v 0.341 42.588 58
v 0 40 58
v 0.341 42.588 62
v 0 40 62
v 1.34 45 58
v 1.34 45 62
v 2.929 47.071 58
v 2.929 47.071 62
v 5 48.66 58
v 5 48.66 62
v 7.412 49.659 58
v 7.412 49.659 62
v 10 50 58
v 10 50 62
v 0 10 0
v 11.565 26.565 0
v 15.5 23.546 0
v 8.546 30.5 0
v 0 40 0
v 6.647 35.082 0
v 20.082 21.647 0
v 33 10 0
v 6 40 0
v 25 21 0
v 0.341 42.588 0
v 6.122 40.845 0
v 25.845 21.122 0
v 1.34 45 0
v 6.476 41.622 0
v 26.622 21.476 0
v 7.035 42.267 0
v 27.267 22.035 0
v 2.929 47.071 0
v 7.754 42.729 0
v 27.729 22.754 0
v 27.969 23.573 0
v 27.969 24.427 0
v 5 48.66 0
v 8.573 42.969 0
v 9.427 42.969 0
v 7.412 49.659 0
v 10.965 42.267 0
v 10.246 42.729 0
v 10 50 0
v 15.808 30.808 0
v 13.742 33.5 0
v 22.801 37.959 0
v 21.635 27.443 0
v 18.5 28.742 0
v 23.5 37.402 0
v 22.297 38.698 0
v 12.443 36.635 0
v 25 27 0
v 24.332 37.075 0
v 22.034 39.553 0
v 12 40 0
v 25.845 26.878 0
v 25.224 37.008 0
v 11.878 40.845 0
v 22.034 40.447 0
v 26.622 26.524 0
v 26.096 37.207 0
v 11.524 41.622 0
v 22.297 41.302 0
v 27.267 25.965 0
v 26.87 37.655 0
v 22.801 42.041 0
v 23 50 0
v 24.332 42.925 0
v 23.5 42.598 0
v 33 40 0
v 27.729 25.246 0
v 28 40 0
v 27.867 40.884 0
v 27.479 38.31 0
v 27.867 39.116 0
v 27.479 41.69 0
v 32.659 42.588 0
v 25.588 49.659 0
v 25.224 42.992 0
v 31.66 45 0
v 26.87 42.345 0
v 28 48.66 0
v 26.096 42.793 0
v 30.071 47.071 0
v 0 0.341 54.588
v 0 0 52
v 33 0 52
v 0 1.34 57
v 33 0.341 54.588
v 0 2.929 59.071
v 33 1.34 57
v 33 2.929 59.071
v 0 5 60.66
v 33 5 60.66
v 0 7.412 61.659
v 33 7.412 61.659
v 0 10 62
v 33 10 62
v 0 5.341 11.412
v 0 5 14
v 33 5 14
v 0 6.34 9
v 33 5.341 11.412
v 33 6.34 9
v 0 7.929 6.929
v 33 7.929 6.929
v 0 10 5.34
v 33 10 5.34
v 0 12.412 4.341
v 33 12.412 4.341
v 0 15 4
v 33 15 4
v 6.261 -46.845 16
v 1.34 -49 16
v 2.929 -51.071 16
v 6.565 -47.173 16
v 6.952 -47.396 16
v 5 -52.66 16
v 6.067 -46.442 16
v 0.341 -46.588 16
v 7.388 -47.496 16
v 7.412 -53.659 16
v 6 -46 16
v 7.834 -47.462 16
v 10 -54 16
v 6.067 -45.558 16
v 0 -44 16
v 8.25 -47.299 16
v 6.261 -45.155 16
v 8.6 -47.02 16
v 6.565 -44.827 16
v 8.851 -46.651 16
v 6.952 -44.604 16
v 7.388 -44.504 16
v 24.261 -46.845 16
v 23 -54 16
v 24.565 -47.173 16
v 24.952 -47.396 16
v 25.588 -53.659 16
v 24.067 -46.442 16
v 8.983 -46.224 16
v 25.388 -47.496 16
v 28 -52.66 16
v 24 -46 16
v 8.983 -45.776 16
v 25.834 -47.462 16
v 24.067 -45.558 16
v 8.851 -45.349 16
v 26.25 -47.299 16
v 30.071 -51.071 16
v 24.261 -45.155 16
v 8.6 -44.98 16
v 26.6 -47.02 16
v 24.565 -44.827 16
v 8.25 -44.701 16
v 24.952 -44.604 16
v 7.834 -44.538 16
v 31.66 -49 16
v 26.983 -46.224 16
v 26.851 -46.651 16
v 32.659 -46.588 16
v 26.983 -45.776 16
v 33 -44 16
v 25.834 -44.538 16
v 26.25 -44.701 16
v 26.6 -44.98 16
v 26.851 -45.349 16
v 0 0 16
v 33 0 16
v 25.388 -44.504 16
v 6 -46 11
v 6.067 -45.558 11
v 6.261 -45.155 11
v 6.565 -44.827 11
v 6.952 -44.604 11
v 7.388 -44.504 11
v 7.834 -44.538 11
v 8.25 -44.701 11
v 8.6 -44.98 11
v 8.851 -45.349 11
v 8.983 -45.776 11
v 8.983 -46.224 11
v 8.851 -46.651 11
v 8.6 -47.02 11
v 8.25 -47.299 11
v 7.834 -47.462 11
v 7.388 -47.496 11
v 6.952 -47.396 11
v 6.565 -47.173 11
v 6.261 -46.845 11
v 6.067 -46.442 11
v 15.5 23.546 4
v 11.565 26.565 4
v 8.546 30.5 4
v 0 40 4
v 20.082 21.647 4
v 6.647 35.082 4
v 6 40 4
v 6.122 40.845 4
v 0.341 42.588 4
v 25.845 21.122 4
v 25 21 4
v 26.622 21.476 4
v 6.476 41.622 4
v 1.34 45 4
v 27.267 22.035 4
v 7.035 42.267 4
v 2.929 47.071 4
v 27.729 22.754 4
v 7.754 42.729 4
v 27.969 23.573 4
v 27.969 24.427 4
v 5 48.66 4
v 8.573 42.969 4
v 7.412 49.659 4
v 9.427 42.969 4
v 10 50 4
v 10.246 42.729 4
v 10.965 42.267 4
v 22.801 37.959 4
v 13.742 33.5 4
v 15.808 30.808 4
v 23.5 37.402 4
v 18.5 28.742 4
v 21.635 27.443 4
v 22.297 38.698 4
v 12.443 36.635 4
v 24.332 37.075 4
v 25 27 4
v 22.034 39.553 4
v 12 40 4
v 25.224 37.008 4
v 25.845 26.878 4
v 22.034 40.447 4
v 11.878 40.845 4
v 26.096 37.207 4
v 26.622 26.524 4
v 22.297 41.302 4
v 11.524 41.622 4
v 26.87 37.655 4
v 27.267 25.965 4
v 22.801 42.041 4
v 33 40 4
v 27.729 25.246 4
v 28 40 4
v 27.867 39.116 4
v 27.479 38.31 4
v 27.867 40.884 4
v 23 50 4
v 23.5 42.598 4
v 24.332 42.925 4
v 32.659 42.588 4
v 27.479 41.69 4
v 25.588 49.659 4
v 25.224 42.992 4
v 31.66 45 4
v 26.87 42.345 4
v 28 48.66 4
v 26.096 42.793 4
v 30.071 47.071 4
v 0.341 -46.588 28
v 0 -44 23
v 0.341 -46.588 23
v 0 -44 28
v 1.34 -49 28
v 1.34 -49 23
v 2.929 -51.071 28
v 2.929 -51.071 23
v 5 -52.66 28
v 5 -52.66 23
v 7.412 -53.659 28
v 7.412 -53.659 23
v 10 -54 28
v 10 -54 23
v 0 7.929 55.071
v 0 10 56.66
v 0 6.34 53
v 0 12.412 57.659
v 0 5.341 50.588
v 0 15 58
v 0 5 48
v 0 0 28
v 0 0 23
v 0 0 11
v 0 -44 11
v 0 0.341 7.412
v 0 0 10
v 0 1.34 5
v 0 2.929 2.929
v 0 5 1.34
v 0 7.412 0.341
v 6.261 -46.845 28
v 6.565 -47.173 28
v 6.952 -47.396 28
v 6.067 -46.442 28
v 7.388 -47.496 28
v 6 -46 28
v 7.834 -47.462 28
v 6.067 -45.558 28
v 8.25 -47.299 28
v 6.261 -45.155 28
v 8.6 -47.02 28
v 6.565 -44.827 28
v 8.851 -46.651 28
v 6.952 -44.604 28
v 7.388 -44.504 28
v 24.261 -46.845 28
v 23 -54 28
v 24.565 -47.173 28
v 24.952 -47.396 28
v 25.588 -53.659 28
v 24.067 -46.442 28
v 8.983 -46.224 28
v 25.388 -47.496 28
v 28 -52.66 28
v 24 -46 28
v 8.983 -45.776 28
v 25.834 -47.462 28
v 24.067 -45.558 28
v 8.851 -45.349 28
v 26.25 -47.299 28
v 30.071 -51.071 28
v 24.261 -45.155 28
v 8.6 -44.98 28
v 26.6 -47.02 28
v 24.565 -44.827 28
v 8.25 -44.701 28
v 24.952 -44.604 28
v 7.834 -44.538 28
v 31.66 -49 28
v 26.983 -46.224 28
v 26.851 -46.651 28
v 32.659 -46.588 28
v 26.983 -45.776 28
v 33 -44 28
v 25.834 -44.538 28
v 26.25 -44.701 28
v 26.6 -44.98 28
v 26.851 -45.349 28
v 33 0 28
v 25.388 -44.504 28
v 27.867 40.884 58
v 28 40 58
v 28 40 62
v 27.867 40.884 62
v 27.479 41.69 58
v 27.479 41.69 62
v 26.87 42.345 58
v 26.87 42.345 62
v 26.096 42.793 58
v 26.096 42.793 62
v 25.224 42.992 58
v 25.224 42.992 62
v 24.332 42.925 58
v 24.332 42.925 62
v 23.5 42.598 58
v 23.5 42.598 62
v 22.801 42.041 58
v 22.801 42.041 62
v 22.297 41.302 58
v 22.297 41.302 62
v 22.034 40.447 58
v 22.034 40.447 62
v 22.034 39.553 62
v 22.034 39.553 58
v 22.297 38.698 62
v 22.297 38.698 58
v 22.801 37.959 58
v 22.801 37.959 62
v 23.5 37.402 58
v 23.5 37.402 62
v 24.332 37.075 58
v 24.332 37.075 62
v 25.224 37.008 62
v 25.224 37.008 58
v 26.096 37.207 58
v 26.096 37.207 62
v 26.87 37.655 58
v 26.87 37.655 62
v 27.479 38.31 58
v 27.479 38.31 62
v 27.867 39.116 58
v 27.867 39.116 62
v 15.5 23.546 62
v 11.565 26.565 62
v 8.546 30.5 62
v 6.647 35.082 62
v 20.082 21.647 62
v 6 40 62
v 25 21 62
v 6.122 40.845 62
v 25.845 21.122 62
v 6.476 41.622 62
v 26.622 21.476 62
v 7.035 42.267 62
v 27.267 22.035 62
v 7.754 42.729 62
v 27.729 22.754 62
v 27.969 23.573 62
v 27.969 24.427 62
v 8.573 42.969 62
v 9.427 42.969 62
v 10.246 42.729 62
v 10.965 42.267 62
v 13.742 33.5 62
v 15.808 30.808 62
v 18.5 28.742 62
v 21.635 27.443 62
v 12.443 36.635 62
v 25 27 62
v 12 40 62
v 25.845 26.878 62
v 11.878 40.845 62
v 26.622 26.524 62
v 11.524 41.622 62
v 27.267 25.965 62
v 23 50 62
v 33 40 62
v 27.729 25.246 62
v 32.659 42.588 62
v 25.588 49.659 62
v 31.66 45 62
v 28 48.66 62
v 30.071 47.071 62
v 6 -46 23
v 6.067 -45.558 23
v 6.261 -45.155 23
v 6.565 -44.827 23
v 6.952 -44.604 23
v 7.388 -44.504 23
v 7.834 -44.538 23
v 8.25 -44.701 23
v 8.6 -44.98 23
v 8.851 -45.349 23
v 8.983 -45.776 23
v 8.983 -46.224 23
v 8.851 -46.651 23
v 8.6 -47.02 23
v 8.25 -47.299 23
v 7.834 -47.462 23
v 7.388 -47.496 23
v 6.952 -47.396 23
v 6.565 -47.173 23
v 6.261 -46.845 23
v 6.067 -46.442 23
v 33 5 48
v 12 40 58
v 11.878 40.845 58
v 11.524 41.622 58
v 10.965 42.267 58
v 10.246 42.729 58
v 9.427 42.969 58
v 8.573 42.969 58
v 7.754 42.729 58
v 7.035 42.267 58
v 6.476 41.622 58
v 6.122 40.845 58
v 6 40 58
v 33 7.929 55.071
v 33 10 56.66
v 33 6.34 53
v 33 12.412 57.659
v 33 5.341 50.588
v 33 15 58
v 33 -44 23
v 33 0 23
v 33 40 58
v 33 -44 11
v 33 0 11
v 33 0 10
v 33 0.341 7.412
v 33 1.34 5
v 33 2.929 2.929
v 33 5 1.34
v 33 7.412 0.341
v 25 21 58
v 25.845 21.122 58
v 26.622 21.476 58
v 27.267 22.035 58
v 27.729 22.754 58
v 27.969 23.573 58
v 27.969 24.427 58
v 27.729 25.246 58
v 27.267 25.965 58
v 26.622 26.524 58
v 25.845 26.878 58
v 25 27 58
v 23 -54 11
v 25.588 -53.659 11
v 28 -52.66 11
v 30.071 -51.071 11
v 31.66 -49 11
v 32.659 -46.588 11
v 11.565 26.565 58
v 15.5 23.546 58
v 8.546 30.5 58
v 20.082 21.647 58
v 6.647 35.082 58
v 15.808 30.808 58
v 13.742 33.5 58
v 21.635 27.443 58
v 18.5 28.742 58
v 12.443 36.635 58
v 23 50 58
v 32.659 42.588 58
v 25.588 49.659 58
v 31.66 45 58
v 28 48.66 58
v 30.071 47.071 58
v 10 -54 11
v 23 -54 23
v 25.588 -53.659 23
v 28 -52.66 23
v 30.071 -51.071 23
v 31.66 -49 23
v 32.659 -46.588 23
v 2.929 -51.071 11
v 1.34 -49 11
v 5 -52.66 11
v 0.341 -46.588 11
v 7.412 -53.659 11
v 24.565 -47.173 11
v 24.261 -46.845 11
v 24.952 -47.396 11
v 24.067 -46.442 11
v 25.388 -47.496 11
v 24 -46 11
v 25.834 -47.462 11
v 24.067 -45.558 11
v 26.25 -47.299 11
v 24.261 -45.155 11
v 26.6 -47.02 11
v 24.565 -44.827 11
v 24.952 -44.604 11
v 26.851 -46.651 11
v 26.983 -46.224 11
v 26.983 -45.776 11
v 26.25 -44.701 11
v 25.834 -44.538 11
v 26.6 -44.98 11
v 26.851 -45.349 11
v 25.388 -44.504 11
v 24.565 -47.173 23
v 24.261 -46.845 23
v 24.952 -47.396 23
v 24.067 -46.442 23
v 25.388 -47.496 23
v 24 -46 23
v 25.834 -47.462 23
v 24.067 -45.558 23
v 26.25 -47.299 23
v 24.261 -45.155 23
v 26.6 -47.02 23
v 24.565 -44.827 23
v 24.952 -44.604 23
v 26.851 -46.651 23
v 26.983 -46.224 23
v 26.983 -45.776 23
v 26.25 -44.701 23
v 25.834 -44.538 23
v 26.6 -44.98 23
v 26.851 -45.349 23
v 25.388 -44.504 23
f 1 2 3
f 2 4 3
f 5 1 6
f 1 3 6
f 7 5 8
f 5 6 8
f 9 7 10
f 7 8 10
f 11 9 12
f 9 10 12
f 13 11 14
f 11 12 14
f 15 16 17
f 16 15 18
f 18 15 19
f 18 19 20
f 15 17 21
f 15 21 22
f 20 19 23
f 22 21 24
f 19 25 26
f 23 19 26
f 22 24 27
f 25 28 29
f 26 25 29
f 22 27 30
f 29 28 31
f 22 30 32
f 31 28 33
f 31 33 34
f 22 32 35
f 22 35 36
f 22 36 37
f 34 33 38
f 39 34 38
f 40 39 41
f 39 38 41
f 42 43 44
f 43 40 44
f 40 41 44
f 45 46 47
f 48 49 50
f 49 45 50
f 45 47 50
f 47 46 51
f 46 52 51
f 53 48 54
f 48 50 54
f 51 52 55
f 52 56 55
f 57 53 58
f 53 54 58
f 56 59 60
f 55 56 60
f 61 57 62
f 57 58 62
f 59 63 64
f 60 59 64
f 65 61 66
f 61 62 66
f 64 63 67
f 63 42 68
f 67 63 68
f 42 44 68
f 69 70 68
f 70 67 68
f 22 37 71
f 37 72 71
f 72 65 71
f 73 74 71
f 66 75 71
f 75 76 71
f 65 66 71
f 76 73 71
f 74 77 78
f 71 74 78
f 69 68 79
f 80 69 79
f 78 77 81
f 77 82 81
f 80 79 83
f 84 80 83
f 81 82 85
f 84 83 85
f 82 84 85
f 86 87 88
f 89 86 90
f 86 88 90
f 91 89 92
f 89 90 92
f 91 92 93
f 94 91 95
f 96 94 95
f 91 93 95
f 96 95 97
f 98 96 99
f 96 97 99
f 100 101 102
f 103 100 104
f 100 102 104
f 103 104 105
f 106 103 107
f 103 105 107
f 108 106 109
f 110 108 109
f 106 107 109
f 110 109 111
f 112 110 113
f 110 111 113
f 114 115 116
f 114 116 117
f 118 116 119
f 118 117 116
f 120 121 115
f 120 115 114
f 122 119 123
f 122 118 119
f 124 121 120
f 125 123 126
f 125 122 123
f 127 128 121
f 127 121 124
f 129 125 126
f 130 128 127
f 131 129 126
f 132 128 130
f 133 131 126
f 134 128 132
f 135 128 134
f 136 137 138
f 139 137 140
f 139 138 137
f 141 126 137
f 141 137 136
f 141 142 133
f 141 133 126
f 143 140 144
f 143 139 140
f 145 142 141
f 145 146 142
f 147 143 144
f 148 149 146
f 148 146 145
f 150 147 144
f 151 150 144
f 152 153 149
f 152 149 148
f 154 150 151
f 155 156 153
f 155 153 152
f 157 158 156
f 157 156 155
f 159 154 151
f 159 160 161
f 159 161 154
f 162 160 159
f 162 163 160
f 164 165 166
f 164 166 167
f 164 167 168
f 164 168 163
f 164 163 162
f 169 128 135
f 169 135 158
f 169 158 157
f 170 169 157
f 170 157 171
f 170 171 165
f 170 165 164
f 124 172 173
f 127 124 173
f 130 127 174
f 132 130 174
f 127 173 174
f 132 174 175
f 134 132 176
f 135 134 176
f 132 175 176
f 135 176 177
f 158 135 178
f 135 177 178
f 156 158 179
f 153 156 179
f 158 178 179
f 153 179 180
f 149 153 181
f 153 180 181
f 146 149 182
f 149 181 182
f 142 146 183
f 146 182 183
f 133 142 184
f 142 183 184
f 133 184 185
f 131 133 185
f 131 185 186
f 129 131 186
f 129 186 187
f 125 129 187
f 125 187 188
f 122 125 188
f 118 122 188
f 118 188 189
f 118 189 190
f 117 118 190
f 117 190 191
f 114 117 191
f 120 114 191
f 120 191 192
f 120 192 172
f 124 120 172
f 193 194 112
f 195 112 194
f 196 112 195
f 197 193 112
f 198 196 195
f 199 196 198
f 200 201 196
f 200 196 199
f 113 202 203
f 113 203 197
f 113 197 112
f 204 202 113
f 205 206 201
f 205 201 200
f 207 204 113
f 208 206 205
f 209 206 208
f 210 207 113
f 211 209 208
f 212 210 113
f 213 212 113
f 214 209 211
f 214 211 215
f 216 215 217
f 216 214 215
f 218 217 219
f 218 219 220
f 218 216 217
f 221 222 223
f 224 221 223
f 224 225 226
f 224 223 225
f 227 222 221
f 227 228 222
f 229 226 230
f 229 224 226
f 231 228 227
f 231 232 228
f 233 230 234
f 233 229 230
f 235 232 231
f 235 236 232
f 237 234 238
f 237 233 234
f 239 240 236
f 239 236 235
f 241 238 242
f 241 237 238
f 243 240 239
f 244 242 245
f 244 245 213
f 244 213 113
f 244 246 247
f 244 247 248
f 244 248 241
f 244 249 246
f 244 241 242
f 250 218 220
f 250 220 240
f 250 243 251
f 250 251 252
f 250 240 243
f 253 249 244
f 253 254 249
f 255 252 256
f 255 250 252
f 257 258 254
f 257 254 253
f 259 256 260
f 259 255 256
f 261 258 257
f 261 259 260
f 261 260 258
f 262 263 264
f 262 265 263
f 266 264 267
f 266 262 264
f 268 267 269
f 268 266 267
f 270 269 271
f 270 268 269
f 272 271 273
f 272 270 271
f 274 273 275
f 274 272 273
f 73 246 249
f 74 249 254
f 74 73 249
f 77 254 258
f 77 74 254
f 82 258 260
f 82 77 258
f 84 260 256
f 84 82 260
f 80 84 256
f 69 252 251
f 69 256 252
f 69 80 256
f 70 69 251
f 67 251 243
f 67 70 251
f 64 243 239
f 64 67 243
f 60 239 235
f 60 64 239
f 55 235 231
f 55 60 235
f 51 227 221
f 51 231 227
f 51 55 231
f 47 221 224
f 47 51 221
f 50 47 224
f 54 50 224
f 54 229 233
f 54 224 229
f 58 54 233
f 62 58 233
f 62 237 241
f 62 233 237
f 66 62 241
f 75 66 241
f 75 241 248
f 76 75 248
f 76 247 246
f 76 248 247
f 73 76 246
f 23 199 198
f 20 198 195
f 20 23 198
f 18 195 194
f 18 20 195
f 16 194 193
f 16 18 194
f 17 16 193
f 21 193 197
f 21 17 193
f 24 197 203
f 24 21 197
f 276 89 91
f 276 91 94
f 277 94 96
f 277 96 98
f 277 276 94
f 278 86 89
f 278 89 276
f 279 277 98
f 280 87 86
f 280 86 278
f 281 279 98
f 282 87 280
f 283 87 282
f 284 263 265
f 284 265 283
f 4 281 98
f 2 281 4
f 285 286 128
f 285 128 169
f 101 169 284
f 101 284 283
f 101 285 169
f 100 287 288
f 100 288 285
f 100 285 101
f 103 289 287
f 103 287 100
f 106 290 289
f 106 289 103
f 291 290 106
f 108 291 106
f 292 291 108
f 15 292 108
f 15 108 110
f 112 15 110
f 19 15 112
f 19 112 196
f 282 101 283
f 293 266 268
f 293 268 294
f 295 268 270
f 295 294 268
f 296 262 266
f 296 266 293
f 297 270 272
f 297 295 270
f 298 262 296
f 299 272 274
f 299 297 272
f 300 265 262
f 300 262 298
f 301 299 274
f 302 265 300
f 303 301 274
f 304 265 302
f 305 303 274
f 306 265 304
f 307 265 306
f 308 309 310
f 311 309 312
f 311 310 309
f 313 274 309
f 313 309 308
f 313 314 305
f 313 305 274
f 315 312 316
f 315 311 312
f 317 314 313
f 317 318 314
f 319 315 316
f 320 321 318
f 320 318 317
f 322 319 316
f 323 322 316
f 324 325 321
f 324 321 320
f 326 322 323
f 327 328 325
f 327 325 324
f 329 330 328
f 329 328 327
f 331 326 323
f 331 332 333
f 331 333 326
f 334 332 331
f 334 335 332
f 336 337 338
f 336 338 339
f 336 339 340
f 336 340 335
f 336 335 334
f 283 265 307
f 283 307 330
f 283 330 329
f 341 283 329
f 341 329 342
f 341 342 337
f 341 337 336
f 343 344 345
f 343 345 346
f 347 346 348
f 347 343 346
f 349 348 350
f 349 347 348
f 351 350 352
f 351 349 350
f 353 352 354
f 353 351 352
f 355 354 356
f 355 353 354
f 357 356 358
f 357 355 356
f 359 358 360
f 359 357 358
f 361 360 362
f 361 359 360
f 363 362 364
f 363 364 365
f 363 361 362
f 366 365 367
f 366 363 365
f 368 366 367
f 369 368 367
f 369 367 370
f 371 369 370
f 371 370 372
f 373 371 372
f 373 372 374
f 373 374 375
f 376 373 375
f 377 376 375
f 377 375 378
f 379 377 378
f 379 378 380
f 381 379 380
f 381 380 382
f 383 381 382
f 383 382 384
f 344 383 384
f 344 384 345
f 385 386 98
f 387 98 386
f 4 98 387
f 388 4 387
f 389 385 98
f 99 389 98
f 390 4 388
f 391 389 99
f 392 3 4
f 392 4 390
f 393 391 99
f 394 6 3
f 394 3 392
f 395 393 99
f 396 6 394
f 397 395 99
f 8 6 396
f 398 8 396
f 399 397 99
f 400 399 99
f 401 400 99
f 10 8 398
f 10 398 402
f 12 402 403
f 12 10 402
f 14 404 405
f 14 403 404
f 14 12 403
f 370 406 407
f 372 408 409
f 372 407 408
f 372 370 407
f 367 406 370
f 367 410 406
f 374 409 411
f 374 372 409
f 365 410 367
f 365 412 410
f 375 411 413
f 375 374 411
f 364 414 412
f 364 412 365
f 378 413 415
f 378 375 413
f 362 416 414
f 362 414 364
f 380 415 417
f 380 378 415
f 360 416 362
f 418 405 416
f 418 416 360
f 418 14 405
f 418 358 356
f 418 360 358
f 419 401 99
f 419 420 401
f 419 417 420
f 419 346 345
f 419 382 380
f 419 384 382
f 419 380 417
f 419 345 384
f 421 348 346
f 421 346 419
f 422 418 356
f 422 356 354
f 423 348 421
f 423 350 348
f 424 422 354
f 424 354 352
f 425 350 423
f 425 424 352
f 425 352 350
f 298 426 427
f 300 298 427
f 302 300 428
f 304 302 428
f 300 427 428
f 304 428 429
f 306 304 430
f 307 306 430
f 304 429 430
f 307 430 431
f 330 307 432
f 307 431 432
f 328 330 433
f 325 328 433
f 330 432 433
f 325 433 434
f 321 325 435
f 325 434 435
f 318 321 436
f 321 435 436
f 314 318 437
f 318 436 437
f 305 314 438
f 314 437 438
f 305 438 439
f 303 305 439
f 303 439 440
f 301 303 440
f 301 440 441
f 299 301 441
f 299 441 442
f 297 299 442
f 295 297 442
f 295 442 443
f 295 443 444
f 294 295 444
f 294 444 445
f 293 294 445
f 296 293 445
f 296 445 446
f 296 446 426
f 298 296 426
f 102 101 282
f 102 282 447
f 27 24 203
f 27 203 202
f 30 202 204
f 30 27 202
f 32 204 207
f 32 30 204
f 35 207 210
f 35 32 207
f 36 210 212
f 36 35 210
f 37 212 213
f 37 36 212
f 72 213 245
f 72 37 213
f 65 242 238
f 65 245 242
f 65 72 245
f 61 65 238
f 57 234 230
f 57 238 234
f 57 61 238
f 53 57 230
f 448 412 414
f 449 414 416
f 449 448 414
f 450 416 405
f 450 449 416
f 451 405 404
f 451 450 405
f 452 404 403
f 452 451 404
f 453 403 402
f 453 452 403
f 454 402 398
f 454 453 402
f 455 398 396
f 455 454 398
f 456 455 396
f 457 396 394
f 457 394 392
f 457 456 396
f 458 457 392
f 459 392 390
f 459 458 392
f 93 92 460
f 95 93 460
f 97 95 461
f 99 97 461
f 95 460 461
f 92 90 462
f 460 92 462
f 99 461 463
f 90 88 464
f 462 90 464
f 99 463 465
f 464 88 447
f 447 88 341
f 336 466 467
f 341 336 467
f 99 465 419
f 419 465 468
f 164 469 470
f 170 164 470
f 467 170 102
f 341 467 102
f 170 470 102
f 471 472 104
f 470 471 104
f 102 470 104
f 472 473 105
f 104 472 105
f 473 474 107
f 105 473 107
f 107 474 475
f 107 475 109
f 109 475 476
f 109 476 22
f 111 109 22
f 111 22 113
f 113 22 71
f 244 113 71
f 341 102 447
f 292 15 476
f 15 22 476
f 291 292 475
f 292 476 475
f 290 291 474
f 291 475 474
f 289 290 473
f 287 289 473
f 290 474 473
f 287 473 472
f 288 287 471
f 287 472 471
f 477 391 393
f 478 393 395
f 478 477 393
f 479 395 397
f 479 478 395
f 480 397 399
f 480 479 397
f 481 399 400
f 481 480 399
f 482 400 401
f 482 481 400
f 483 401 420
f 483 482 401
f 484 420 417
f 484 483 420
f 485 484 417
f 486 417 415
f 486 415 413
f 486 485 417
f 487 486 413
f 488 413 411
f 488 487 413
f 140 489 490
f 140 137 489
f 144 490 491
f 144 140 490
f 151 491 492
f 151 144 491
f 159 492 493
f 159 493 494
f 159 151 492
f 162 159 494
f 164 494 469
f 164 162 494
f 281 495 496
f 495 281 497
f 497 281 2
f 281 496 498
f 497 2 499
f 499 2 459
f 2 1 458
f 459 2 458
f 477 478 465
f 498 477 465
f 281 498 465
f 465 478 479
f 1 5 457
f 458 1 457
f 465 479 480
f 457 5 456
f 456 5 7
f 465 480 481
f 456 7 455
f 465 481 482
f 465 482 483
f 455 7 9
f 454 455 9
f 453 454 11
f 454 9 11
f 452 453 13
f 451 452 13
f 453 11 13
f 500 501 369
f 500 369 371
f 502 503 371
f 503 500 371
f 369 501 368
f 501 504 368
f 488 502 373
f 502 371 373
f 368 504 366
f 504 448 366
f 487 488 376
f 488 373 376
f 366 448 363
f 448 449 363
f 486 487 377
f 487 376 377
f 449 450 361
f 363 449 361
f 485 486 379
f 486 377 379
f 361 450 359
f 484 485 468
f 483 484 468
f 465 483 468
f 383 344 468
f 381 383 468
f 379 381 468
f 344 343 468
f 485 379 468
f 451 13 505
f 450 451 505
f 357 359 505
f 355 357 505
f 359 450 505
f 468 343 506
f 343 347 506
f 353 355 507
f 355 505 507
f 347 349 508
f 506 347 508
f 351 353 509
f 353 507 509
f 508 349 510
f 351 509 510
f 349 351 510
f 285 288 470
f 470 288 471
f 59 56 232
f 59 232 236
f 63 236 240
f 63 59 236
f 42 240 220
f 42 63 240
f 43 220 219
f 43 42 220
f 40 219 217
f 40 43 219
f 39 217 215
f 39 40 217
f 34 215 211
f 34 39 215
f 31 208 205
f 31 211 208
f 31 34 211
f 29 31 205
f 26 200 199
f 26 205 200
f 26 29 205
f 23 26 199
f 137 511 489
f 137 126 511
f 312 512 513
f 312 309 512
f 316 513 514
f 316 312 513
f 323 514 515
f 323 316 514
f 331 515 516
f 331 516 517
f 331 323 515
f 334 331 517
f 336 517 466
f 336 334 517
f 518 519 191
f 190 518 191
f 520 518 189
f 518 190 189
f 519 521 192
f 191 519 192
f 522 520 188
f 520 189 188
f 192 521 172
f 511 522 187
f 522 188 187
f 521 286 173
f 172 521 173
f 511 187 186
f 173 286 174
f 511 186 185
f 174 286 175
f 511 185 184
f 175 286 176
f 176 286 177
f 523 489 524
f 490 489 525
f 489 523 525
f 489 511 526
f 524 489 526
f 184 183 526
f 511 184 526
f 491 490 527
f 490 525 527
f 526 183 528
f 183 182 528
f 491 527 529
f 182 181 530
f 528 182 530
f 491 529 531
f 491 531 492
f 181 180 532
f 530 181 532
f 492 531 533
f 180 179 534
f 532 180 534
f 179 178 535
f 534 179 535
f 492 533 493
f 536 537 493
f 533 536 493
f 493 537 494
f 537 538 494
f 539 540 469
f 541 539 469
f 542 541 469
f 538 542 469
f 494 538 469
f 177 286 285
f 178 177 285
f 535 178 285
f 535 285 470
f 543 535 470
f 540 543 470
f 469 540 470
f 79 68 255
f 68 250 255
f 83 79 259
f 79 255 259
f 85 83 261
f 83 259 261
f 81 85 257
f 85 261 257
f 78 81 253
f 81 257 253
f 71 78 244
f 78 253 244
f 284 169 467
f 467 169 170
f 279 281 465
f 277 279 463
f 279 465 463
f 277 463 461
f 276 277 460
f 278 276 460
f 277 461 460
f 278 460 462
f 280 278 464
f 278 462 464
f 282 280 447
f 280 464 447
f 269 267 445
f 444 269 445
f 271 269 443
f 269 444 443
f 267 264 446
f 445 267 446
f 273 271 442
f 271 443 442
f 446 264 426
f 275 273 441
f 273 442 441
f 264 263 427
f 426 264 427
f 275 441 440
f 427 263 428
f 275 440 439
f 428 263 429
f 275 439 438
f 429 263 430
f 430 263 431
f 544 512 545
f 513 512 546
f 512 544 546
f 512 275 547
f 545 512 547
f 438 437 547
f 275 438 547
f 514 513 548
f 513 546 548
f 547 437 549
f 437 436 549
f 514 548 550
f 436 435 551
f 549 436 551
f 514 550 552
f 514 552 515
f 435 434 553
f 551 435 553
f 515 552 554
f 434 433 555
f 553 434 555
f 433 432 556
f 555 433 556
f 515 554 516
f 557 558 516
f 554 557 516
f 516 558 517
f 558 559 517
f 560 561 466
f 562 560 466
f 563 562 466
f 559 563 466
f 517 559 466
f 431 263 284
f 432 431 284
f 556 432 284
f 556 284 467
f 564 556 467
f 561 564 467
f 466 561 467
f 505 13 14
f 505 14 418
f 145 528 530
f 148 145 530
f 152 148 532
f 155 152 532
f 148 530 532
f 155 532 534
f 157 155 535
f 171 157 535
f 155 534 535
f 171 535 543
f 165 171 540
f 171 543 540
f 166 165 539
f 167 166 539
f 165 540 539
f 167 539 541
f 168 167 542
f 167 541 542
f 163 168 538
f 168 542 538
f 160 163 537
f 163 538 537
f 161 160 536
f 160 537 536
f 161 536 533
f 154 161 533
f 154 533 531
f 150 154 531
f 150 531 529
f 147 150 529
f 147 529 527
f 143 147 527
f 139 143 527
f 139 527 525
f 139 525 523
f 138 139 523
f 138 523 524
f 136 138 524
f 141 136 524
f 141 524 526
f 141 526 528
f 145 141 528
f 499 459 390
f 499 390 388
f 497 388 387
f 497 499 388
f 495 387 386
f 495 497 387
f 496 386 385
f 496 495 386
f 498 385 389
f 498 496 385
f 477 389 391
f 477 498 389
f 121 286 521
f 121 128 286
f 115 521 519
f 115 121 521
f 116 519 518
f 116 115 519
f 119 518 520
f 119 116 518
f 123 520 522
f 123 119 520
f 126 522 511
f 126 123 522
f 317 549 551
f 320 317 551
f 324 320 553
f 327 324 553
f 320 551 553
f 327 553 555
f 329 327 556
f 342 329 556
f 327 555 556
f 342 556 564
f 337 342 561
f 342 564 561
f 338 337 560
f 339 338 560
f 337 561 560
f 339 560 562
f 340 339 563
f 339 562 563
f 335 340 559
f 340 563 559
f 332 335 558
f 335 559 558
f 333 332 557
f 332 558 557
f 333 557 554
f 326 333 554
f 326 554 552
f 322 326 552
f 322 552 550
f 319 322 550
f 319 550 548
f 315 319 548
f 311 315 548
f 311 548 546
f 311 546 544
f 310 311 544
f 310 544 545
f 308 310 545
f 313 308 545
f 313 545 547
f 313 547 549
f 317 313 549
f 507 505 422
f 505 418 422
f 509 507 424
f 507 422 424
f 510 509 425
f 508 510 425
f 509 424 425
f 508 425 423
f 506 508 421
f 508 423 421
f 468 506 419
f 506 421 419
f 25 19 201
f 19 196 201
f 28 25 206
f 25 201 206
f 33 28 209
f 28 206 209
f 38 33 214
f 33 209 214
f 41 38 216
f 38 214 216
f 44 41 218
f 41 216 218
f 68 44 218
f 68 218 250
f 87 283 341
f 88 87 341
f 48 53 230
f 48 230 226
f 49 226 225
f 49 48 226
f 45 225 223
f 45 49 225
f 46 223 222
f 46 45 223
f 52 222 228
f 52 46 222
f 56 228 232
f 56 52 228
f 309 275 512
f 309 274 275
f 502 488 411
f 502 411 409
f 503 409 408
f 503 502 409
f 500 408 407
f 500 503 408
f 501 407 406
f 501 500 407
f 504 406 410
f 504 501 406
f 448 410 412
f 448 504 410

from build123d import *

# Parameters (mm, degrees)
ESBO_O1_W                = 33
ESBO_O1_H                = 50
ESBO_O1_R                = 3
RESSALTO_EXTRUS_O2_DEPTH = 62
ESBO_O3_W                = 33
ESBO_O3_H                = 54
CORTE_EXTRUS_O1_DEPTH    = 45
ESBO_O7_W                = 33
ESBO_O7_H                = 5
RESSALTO_EXTRUS_O3_DEPTH = 54
ESBO_O10_R               = 1.5
CORTE_EXTRUS_O2_DEPTH    = 82.277303105
FILETE1_R                = 10


with BuildPart() as part:
    # Esboço1 → Ressalto-extrusão2 (new body)
    with BuildSketch(Plane.XY):
        with Locations((16.5, 25)):
            Rectangle(ESBO_O1_W, ESBO_O1_H)
        with Locations((25, 40)):
            Circle(ESBO_O1_R, mode=Mode.SUBTRACT)
        with BuildLine():
            ThreePointArc((6, 40), (11.564971157, 26.564971157), (25, 21))
            ThreePointArc((25, 21), (28, 24), (25, 27))
            ThreePointArc((25, 27), (15.807611845, 30.807611845), (12, 40))
            ThreePointArc((12, 40), (9, 43), (6, 40))
        make_face(mode=Mode.SUBTRACT)
    extrude(amount=RESSALTO_EXTRUS_O2_DEPTH)

    # Esboço3 → Corte-extrusão1 (cut)
    with BuildSketch(Plane(origin=(0, 50, 0), x_dir=(1, 0, 0), z_dir=(0, 1, 0))):
        with Locations((16.5, -31)):
            Rectangle(ESBO_O3_W, ESBO_O3_H)
    extrude(amount=-CORTE_EXTRUS_O1_DEPTH, mode=Mode.SUBTRACT)

    # Esboço7 → Ressalto-extrusão3 (add)
    with BuildSketch(Plane.XZ):
        with Locations((16.5, 25.5)):
            Rectangle(ESBO_O7_W, ESBO_O7_H)
        with Locations((16.5, 13.5)):
            Rectangle(ESBO_O7_W, ESBO_O7_H)
    extrude(amount=RESSALTO_EXTRUS_O3_DEPTH)

    # Esboço10 → Corte-extrusão2 (cut, through all)
    with BuildSketch(Plane(origin=(0, 0, 11), x_dir=(-1, 0, 0), z_dir=(0, 0, -1))):
        with Locations((-25.5, -46)):
            Circle(ESBO_O10_R)
        with Locations((-7.5, -46)):
            Circle(ESBO_O10_R)
    extrude(amount=-CORTE_EXTRUS_O2_DEPTH, mode=Mode.SUBTRACT)

    # Filete1
    filete1_edges = [part.edges().sort_by_distance(p)[0] for p in [
        (0, 50, 2),
        (33, 50, 2),
        (16.5, 5, 4),
        (16.5, 5, 58),
        (16.5, 0, 62),
        (16.5, 0, 0),
        (33, -54, 25.5),
        (0, -54, 25.5),
        (33, -54, 13.5),
        (0, -54, 13.5),
        (0, 50, 60),
        (33, 50, 60),
    ]]
    fillet(filete1_edges, radius=FILETE1_R)


solid = part.part
